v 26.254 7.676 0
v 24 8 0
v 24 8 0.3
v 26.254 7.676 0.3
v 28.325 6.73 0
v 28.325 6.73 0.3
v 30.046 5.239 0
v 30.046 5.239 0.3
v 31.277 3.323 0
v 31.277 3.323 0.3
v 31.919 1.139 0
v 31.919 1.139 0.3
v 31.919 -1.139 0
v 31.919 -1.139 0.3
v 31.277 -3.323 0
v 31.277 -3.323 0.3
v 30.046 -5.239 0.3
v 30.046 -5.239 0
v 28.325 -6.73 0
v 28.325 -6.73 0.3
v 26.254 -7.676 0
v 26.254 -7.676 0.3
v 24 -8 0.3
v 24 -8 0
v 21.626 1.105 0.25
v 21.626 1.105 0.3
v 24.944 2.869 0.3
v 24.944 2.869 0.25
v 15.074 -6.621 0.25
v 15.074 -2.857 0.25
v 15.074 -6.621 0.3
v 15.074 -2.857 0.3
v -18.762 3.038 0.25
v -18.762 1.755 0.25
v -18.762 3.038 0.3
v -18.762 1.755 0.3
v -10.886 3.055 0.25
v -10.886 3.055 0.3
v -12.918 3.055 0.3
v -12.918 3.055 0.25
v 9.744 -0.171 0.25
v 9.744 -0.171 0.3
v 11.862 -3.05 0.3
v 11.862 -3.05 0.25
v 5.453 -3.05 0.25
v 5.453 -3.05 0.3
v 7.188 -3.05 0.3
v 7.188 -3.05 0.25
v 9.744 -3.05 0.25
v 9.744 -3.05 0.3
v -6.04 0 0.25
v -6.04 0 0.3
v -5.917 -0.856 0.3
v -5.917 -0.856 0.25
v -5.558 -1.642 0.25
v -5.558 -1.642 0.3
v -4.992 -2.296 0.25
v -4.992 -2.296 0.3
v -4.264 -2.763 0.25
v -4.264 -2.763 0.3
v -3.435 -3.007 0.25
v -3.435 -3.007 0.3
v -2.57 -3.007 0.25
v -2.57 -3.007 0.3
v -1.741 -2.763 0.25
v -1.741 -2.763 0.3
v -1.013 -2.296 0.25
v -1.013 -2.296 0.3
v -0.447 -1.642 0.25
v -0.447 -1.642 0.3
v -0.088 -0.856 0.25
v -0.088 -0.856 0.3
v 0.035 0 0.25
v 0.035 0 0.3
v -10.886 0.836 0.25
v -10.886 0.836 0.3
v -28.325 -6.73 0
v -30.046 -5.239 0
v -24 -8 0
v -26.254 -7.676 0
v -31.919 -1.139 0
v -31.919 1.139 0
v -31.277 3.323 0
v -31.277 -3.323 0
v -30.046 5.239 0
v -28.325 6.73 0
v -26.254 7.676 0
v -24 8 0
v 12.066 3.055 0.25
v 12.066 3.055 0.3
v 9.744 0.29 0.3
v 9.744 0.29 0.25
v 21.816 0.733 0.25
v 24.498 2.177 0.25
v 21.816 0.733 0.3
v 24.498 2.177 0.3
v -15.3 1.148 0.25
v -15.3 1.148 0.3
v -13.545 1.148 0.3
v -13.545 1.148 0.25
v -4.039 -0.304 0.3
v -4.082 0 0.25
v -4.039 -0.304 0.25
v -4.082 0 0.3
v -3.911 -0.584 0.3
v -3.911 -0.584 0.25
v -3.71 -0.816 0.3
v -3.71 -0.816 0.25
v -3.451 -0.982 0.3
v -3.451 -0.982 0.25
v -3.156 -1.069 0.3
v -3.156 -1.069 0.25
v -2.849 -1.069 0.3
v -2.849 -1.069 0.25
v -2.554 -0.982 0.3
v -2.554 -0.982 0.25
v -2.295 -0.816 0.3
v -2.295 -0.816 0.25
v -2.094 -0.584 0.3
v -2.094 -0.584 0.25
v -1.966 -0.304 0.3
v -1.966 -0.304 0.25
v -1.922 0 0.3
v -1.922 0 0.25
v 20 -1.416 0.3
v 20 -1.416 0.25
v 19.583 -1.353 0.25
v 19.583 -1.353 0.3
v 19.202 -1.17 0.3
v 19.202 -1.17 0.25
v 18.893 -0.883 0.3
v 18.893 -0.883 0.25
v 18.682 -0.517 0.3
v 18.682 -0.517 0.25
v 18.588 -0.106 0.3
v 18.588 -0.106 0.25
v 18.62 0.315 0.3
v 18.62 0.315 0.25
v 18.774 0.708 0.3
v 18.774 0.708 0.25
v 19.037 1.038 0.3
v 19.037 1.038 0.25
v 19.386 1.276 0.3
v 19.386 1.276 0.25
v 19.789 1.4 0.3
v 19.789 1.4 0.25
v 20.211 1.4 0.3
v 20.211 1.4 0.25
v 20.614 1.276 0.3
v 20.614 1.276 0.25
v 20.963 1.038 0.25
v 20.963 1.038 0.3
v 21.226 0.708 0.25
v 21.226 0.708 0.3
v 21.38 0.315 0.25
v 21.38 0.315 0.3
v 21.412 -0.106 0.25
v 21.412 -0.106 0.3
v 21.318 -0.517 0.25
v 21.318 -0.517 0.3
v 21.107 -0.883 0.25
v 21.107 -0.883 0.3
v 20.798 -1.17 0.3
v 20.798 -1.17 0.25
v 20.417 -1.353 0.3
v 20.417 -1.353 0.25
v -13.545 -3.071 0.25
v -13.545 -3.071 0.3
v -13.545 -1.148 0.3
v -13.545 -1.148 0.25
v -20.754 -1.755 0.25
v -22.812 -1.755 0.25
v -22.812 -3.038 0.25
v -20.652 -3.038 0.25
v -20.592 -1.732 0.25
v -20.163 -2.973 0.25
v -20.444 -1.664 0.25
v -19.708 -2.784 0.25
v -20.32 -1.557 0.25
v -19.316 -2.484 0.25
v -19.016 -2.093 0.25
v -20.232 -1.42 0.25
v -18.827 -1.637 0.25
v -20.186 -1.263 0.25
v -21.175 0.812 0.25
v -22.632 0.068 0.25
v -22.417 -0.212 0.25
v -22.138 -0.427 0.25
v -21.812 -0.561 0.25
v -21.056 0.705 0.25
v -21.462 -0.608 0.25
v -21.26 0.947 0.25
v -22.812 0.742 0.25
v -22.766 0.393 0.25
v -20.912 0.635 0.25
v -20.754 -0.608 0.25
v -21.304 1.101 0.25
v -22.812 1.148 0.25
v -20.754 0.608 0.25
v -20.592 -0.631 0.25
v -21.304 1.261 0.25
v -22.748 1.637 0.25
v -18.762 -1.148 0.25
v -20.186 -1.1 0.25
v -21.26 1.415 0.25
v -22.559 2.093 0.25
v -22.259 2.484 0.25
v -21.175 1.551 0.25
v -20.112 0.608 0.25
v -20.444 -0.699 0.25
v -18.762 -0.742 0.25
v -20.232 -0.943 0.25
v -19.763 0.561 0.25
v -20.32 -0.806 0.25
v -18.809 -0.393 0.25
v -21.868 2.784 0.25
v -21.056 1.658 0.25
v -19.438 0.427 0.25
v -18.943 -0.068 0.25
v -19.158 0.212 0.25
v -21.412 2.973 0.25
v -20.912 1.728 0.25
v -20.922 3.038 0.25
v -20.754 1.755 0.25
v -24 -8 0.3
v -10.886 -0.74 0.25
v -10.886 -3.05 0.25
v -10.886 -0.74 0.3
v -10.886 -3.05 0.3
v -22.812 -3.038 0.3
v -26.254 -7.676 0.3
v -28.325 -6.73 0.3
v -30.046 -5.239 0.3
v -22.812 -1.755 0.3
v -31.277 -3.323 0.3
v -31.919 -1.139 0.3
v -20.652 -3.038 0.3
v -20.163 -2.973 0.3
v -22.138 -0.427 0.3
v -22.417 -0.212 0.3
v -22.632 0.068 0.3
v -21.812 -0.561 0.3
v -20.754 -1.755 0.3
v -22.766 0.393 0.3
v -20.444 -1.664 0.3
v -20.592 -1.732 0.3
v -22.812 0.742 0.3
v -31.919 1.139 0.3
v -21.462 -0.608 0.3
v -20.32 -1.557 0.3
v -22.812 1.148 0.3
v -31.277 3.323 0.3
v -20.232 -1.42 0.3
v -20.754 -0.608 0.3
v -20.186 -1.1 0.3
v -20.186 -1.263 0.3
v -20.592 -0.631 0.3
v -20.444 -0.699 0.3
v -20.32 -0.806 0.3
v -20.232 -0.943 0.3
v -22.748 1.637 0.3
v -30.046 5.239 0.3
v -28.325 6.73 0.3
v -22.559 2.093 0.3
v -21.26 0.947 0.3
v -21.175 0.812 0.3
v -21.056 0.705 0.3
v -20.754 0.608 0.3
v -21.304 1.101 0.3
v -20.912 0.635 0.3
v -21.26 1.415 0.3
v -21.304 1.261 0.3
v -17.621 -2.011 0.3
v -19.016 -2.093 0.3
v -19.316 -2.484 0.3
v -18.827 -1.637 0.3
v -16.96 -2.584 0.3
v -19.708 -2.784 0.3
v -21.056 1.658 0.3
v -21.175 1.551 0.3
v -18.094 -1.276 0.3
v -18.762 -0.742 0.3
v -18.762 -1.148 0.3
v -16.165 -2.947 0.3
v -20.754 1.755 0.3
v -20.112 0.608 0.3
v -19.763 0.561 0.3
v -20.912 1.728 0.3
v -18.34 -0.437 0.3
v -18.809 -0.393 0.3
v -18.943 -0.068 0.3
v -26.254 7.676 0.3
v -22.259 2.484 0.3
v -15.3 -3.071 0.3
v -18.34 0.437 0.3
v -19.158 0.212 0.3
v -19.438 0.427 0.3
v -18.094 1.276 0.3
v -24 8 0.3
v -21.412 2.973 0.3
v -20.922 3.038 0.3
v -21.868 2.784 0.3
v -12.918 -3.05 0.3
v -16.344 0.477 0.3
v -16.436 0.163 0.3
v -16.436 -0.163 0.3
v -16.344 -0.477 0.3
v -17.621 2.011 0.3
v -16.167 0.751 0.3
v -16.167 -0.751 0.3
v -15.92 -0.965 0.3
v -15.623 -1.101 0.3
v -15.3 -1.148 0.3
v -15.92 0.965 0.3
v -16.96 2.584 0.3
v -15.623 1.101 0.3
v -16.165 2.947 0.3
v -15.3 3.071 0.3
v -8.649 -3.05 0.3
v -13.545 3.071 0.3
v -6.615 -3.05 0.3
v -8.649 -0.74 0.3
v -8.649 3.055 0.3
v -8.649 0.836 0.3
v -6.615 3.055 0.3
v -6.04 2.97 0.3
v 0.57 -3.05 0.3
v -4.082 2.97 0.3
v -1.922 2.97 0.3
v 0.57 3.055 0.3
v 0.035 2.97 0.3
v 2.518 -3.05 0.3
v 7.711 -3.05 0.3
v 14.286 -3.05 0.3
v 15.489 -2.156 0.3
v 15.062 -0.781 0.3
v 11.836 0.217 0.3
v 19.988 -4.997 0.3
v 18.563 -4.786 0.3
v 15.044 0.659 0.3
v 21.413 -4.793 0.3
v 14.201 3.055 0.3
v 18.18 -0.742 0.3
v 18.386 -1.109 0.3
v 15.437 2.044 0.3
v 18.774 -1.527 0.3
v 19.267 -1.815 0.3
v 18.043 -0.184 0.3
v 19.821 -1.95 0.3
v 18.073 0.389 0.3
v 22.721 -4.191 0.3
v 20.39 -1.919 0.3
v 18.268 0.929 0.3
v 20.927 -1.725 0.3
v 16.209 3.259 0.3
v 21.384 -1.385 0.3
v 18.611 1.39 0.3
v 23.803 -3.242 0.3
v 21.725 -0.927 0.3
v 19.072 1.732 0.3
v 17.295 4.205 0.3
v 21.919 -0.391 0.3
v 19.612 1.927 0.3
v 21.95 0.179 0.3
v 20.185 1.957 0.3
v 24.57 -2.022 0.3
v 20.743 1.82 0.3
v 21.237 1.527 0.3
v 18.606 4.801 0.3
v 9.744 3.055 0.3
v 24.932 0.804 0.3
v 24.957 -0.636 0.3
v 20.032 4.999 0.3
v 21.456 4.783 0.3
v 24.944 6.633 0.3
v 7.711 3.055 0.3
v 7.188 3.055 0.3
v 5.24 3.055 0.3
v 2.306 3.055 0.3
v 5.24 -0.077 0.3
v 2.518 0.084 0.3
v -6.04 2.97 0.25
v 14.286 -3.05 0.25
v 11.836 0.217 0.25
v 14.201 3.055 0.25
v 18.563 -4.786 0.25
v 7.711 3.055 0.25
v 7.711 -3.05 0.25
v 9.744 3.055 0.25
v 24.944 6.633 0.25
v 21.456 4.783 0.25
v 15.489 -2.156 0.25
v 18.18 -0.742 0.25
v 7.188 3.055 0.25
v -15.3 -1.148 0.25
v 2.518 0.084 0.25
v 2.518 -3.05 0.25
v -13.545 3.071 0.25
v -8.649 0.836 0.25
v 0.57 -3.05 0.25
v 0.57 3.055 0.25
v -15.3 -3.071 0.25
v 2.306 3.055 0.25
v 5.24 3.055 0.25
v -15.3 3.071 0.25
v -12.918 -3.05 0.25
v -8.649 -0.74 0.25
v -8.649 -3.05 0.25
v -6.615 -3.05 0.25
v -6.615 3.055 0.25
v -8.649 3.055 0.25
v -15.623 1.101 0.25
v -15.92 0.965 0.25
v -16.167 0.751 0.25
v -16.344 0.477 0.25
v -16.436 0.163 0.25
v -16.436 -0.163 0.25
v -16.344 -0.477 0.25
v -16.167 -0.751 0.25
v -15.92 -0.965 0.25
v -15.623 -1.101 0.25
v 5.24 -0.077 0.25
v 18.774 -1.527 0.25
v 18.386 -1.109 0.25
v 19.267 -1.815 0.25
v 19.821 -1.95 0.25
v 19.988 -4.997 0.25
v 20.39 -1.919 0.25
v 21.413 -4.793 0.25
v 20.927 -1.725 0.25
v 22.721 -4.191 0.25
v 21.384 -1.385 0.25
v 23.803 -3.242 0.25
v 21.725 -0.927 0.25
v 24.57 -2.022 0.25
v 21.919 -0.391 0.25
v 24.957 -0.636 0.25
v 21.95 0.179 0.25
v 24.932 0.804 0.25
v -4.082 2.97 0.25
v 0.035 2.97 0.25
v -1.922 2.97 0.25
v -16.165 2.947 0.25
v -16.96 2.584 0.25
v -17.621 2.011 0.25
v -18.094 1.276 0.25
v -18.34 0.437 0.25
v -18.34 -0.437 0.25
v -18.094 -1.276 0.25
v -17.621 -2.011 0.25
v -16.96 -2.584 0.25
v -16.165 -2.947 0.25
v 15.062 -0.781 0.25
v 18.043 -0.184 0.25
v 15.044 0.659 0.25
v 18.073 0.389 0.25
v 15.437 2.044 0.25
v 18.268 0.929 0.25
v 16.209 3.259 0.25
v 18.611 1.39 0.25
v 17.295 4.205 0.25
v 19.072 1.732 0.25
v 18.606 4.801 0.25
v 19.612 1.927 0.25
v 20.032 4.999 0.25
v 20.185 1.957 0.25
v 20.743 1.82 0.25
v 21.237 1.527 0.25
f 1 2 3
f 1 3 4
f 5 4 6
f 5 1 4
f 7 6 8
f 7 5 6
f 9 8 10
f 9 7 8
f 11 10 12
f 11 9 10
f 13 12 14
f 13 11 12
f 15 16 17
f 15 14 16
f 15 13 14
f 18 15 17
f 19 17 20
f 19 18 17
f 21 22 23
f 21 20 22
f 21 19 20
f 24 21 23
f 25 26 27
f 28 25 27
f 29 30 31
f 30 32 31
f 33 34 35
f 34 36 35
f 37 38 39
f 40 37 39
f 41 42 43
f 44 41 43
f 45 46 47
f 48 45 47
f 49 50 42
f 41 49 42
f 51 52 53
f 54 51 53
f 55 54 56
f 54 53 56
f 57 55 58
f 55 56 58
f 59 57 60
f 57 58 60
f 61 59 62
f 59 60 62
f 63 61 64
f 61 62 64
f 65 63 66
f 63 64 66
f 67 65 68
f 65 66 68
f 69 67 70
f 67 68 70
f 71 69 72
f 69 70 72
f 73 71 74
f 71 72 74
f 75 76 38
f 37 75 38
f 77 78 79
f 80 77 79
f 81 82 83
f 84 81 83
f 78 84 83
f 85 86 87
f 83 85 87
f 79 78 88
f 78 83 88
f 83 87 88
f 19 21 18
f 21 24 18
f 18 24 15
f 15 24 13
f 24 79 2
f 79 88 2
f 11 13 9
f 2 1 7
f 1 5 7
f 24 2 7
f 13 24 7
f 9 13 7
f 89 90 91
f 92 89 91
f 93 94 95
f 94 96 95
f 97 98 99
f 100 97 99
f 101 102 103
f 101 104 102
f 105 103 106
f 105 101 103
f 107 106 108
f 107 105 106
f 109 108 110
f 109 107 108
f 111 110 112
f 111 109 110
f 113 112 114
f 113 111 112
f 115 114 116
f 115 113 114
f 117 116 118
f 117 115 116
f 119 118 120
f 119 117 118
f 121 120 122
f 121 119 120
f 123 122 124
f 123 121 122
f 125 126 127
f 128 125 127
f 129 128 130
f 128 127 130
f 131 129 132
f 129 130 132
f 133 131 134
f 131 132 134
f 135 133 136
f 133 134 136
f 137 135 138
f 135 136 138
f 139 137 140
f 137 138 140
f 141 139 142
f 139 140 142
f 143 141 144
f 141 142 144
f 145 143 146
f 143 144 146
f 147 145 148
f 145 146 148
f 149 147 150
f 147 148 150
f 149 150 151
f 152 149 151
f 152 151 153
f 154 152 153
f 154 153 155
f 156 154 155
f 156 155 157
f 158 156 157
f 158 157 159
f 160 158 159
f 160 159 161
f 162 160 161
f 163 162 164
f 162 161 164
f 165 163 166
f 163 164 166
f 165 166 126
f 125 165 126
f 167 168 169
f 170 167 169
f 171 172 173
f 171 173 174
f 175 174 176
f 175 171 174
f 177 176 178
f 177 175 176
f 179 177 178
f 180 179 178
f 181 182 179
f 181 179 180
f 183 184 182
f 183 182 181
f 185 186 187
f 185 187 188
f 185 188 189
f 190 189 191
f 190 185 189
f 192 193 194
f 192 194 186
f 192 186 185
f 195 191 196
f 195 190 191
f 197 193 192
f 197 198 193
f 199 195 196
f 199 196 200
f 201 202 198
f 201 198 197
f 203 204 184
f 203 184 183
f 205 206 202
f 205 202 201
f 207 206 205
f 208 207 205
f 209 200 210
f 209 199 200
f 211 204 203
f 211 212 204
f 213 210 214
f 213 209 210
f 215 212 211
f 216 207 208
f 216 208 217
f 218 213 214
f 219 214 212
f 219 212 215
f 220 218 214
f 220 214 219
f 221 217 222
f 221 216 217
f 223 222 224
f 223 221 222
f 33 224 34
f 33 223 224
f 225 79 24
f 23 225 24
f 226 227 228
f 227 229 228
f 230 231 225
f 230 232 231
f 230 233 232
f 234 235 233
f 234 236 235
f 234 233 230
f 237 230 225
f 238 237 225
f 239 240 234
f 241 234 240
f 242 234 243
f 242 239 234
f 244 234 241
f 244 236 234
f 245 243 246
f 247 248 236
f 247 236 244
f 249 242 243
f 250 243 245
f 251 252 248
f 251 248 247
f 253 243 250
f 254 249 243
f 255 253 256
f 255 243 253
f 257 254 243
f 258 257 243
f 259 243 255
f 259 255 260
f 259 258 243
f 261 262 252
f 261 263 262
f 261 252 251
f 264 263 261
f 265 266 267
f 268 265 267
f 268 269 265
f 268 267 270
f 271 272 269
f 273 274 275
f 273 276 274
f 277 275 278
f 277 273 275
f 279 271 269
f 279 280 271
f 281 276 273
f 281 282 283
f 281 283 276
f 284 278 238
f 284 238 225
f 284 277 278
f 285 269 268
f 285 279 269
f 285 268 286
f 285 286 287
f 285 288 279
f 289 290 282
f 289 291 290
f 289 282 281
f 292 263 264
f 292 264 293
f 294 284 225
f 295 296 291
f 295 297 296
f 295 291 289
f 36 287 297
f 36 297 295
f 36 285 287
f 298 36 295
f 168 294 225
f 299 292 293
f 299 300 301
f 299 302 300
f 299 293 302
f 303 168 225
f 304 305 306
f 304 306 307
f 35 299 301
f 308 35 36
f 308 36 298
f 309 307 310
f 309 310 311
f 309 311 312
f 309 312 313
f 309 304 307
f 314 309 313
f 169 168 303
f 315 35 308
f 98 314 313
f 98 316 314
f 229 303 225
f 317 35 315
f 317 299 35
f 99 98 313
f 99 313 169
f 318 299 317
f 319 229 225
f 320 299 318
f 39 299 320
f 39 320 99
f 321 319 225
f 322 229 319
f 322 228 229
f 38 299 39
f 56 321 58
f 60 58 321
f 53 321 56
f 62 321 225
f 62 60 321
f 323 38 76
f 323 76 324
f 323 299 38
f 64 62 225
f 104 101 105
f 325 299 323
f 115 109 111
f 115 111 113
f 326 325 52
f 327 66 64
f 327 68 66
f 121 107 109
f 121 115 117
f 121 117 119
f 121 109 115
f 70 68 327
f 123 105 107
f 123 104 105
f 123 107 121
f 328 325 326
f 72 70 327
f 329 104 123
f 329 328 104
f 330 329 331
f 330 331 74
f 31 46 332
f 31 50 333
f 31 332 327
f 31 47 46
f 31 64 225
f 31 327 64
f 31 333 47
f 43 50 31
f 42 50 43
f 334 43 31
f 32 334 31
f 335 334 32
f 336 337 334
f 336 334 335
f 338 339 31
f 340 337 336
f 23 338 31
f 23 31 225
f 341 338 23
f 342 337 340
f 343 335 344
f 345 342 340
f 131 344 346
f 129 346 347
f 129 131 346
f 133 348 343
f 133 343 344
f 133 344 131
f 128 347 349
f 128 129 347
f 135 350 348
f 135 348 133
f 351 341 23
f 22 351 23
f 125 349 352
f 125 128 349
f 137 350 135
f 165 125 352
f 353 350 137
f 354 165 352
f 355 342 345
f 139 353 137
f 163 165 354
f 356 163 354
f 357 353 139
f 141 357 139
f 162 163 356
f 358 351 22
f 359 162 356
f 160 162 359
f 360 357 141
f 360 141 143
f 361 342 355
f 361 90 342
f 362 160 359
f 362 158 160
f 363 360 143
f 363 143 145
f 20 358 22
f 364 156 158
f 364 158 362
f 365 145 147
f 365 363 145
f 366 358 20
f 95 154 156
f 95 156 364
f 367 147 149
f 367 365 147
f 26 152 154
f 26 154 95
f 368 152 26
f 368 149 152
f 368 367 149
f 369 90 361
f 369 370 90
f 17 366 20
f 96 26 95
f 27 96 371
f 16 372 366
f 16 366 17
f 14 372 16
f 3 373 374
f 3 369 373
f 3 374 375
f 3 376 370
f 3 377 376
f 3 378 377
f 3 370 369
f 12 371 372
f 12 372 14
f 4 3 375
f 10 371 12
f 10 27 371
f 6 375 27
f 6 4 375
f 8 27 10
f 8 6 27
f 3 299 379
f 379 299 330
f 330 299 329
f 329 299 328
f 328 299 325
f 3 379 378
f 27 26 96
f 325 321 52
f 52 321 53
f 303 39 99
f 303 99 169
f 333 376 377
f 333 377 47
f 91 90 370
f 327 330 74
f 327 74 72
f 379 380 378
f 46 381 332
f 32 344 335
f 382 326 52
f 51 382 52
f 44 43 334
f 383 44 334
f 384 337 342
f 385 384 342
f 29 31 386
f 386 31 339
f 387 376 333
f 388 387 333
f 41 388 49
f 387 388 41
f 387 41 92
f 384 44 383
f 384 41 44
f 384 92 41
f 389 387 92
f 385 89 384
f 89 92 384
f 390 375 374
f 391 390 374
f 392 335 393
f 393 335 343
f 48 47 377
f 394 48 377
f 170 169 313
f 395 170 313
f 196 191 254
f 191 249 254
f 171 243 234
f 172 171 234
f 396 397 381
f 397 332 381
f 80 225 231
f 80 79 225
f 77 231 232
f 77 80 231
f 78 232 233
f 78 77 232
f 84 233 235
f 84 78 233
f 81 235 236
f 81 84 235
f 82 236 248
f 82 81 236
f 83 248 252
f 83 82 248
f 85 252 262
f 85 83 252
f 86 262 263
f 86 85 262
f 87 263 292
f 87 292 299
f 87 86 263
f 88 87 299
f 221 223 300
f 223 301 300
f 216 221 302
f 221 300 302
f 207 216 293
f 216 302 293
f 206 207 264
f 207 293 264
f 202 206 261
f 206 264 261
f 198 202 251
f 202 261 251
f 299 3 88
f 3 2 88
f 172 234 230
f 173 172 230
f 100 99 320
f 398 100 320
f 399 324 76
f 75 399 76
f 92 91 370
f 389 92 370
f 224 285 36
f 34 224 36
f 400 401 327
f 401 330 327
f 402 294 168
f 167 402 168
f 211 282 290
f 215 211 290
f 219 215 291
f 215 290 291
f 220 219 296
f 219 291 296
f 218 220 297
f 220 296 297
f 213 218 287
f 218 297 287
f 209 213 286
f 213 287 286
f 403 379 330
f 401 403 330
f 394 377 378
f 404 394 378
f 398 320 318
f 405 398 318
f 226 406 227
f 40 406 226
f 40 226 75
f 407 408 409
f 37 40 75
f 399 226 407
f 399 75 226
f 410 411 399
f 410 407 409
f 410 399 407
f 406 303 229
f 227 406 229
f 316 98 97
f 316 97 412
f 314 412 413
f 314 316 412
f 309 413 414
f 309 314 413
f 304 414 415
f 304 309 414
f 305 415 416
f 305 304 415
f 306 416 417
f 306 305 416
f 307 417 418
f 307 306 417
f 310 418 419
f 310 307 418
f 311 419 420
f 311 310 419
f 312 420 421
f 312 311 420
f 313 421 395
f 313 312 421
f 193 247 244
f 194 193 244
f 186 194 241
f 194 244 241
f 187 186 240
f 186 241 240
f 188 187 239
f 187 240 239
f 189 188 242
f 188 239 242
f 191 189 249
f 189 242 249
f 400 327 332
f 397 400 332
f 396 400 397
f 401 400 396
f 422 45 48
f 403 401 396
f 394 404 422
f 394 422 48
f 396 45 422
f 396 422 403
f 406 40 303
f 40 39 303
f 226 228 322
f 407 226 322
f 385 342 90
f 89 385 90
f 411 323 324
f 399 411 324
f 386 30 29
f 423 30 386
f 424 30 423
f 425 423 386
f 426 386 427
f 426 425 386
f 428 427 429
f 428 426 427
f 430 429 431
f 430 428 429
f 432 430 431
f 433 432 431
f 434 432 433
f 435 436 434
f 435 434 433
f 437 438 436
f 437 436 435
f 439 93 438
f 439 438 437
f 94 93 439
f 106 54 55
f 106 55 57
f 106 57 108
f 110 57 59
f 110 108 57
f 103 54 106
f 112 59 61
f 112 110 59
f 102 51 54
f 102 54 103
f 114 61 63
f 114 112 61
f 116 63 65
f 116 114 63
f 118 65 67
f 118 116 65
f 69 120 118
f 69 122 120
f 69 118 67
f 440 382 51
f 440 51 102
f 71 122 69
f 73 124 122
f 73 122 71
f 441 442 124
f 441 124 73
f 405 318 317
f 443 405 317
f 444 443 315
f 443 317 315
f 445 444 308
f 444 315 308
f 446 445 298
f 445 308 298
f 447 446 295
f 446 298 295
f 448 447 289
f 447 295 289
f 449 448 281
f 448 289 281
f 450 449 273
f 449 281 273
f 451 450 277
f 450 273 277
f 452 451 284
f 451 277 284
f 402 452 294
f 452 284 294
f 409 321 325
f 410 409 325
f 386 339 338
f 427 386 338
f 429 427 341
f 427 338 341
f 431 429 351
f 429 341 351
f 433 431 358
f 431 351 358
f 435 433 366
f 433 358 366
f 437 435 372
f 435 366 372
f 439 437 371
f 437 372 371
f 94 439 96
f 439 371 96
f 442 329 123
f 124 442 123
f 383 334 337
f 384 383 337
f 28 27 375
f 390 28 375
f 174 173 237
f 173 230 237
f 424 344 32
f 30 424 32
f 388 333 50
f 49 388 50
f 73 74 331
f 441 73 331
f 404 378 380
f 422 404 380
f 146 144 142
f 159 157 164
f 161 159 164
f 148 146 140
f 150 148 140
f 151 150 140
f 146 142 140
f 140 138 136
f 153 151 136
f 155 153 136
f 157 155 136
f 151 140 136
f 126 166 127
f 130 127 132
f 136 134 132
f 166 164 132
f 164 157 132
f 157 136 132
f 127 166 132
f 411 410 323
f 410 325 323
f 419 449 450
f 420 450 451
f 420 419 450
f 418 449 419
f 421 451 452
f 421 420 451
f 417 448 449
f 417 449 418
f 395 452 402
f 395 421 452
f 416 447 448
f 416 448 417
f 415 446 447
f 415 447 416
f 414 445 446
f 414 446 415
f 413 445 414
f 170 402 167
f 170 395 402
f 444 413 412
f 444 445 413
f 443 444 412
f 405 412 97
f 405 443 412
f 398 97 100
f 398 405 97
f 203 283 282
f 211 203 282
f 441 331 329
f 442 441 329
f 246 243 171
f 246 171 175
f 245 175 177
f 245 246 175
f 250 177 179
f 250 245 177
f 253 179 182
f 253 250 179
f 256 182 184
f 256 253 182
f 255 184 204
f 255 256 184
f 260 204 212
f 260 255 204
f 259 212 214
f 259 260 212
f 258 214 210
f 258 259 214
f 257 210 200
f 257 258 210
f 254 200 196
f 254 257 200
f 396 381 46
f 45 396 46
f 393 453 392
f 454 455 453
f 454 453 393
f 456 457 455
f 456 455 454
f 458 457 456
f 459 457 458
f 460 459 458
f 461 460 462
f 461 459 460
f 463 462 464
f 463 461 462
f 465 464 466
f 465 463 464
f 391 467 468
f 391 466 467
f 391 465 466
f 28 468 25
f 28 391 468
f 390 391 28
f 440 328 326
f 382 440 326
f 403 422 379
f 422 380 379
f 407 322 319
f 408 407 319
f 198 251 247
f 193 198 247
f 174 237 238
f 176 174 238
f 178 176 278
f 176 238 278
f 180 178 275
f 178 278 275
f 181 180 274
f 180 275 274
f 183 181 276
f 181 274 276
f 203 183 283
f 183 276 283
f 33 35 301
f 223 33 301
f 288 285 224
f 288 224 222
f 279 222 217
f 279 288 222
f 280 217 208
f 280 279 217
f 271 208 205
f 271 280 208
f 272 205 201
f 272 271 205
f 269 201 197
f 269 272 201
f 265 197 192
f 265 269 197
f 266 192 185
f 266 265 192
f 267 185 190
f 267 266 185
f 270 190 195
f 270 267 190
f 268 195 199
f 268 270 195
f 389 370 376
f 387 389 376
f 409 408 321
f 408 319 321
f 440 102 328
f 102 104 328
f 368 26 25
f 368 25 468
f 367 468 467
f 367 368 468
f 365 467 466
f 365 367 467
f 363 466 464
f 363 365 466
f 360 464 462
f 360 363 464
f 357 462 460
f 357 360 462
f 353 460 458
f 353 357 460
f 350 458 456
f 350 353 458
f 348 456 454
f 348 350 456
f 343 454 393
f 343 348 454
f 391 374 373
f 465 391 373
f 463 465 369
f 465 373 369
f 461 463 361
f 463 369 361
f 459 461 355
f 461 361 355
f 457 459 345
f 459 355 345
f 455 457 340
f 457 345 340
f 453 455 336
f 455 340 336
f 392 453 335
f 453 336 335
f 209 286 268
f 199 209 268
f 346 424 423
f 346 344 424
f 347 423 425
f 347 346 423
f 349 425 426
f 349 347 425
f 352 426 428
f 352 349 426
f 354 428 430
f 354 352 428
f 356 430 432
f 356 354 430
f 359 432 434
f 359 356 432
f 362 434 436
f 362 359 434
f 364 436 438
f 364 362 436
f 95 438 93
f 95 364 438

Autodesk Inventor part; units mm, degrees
sketch "Sketch_1" plane through (0, 0, 0) normal (0, 0, 1) x (1, 0, 0)
  arc A0 (-32, 0) -> (-24, -8) centre (-24, 0) ccw
  line L0 (-24, -8) -> (24, -8)
  arc A1 (24, -8) -> (32, 0) centre (24, 0) ccw
  arc A2 (32, 0) -> (24, 8) centre (24, 0) ccw
  line L1 (24, 8) -> (-24, 8)
  arc A3 (-24, 8) -> (-32, 0) centre (-24, 0) ccw
extrude "Extrusion1" add sketch "Sketch_1" along normal blind 0.3
sketch "Sketch_13" plane through (0, 0, 0.3) normal (0, 0, 1) x (1, 0, 0)
  line L0 (-12.9184, 3.0554) -> (-12.9184, -3.0496)
  line L1 (-12.9184, -3.0496) -> (-10.8856, -3.0496)
  line L2 (-10.8856, -3.0496) -> (-10.8856, -0.7401)
  line L3 (-10.8856, -0.7401) -> (-8.6487, -0.7401)
  line L4 (-8.6487, -0.7401) -> (-8.6487, -3.0496)
  line L5 (-8.6487, -3.0496) -> (-6.6154, -3.0496)
  line L6 (-6.6154, -3.0496) -> (-6.6154, 3.0554)
  line L7 (-6.6154, 3.0554) -> (-8.6487, 3.0554)
  line L8 (-8.6487, 3.0554) -> (-8.6487, 0.8356)
  line L9 (-8.6487, 0.8356) -> (-10.8856, 0.8356)
  line L10 (-10.8856, 0.8356) -> (-10.8856, 3.0554)
  line L11 (-10.8856, 3.0554) -> (-12.9184, 3.0554)
extrude "Extrusion2" cut sketch "Sketch_13" against normal blind 0.05
sketch "Sketch_15" plane through (0, 0, 0.3) normal (0, 0, 1) x (1, 0, 0)
  line L0 (0.5704, 3.0554) -> (0.5704, -3.0496)
  line L1 (0.5704, -3.0496) -> (2.5185, -3.0496)
  line L2 (2.5185, -3.0496) -> (2.5185, 0.0838)
  line L3 (2.5185, 0.0838) -> (5.4533, -3.0496)
  line L4 (5.4533, -3.0496) -> (7.188, -3.0496)
  line L5 (7.188, -3.0496) -> (7.188, 3.0554)
  line L6 (7.188, 3.0554) -> (5.2404, 3.0554)
  line L7 (5.2404, 3.0554) -> (5.2404, -0.0774)
  line L8 (5.2404, -0.0774) -> (2.3062, 3.0554)
  line L9 (2.3062, 3.0554) -> (0.5704, 3.0554)
extrude "Extrusion3" cut sketch "Sketch_15" against normal blind 0.05
sketch "Sketch_16" plane through (0, 0, 0.3) normal (0, 0, 1) x (1, 0, 0)
  line L0 (7.711, 3.0554) -> (7.711, -3.0496)
  line L1 (7.711, -3.0496) -> (9.7438, -3.0496)
  line L2 (9.7438, -3.0496) -> (9.7438, -0.1709)
  line L3 (9.7438, -0.1709) -> (11.8624, -3.0496)
  line L4 (11.8624, -3.0496) -> (14.2863, -3.0496)
  line L5 (14.2863, -3.0496) -> (11.836, 0.2174)
  line L6 (11.836, 0.2174) -> (14.201, 3.0554)
  line L7 (14.201, 3.0554) -> (12.0659, 3.0554)
  line L8 (12.0659, 3.0554) -> (9.7438, 0.2895)
  line L9 (9.7438, 0.2895) -> (9.7438, 3.0554)
  line L10 (9.7438, 3.0554) -> (7.711, 3.0554)
extrude "Extrusion4" cut sketch "Sketch_16" against normal blind 0.05
sketch "Sketch_5" plane through (0, 0, 0.3) normal (0, 0, 1) x (1, 0, 0)
  arc A0 (-22.8125, 0.7425) -> (-21.4625, -0.6075) centre (-21.4625, 0.7425) ccw
  line L0 (-21.4625, -0.6075) -> (-20.7538, -0.6075)
  arc A1 (-20.7538, -1.755) -> (-20.7538, -0.6075) centre (-20.7538, -1.1812) ccw
  line L1 (-20.7538, -1.755) -> (-22.8125, -1.755)
  line L2 (-22.8125, -1.755) -> (-22.8125, -3.0375)
  line L3 (-22.8125, -3.0375) -> (-20.6525, -3.0375)
  arc A2 (-20.6525, -3.0375) -> (-18.7625, -1.1475) centre (-20.6525, -1.1475) ccw
  line L4 (-18.7625, -1.1475) -> (-18.7625, -0.7425)
  arc A3 (-18.7625, -0.7425) -> (-20.1125, 0.6075) centre (-20.1125, -0.7425) ccw
  line L5 (-20.1125, 0.6075) -> (-20.7538, 0.6075)
  arc A4 (-20.7538, 1.755) -> (-20.7538, 0.6075) centre (-20.7358, 1.1812) ccw
  line L6 (-20.7538, 1.755) -> (-18.7625, 1.755)
  line L7 (-18.7625, 1.755) -> (-18.7625, 3.0375)
  line L8 (-18.7625, 3.0375) -> (-20.9225, 3.0375)
  arc A5 (-20.9225, 3.0375) -> (-22.8125, 1.1475) centre (-20.9225, 1.1475) ccw
  line L9 (-22.8125, 1.1475) -> (-22.8125, 0.7425)
extrude "Extrusion5" cut sketch "Sketch_5" against normal blind 0.05
sketch "Sketch_6" plane through (0, 0, 0.3) normal (0, 0, 1) x (1, 0, 0)
  arc A0 (-15.3, 3.0713) -> (-15.3, -3.0713) centre (-15.3, 0) ccw
  line L0 (-15.3, -3.0713) -> (-13.545, -3.0713)
  line L1 (-13.545, -3.0713) -> (-13.545, -1.1475)
  line L2 (-13.545, -1.1475) -> (-15.3, -1.1475)
  arc A1 (-15.3, 1.1475) -> (-15.3, -1.1475) centre (-15.3, 0) ccw
  line L3 (-15.3, 1.1475) -> (-13.545, 1.1475)
  line L4 (-13.545, 1.1475) -> (-13.545, 3.0713)
  line L5 (-13.545, 3.0713) -> (-15.3, 3.0713)
extrude "Extrusion6" cut sketch "Sketch_6" against normal blind 0.05
sketch "Sketch_7" plane through (0, 0, 0.3) normal (0, 0, 1) x (1, 0, 0)
  line L0 (-6.04, 2.97) -> (-6.04, 0)
  arc A0 (-6.04, 0) -> (0.035, 0) centre (-3.0025, 0) ccw
  line L1 (0.035, 0) -> (0.035, 2.97)
  line L2 (0.035, 2.97) -> (-1.9225, 2.97)
  line L3 (-1.9225, 2.97) -> (-1.9225, 0)
  arc A1 (-4.0825, 0) -> (-1.9225, 0) centre (-3.0025, 0) ccw
  line L4 (-4.0825, 0) -> (-4.0825, 2.97)
  line L5 (-4.0825, 2.97) -> (-6.04, 2.97)
extrude "Extrusion7" cut sketch "Sketch_7" against normal blind 0.05
sketch "Sketch8" plane through (0, 0, 0.3) normal (0, 0, 1) x (1, 0, 0)
  point P0 (20, 0)
hole "Hole1" at (20, 0, 0.3) direction (0, 0, -1) diameter 2.832 depth 0.05
sketch "Sketch_3" plane through (0, 0, 0.3) normal (0, 0, 1) x (1, 0, 0)
  arc A0 (21.4558, 4.7829) -> (15.4894, -2.1564) centre (20, 0) ccw
  line L0 (15.4894, -2.1564) -> (18.1798, -0.7416)
  arc A1 (21.6256, 1.1048) -> (18.1798, -0.7416) centre (20, 0) ccw
  line L1 (21.6256, 1.1048) -> (24.9442, 2.8689)
  line L2 (24.9442, 2.8689) -> (24.9442, 6.6331)
  line L3 (24.9442, 6.6331) -> (21.4558, 4.7829)
extrude "Extrusion8" cut sketch "Sketch_3" against normal blind 0.05
sketch "Sketch_4" plane through (0, 0, 0.3) normal (0, 0, 1) x (1, 0, 0)
  line L0 (15.0735, -2.8571) -> (15.0735, -6.6213)
  line L1 (15.0735, -6.6213) -> (18.5633, -4.7863)
  arc A0 (18.5633, -4.7863) -> (24.4981, 2.1771) centre (20, 0) ccw
  line L2 (24.4981, 2.1771) -> (21.8157, 0.7331)
  arc A1 (18.3864, -1.1091) -> (21.8157, 0.7331) centre (20, 0) ccw
  line L3 (18.3864, -1.1091) -> (15.0735, -2.8571)
extrude "Extrusion9" cut sketch "Sketch_4" against normal blind 0.05
ref_plane "aluschild_XY" through (0, 0, 0) normal (0, 0, 1) x (1, 0, 0)
ref_plane "aluschild_YZ" through (0, 0, 0) normal (1, 0, 0) x (0, 1, 0)
ref_plane "aluschild_ZX" through (0, 0, 0) normal (0, 1, 0) x (0, 0, 1)
properties part number "SCHUNK-9957615 Typenschild 16x64x0.3"
